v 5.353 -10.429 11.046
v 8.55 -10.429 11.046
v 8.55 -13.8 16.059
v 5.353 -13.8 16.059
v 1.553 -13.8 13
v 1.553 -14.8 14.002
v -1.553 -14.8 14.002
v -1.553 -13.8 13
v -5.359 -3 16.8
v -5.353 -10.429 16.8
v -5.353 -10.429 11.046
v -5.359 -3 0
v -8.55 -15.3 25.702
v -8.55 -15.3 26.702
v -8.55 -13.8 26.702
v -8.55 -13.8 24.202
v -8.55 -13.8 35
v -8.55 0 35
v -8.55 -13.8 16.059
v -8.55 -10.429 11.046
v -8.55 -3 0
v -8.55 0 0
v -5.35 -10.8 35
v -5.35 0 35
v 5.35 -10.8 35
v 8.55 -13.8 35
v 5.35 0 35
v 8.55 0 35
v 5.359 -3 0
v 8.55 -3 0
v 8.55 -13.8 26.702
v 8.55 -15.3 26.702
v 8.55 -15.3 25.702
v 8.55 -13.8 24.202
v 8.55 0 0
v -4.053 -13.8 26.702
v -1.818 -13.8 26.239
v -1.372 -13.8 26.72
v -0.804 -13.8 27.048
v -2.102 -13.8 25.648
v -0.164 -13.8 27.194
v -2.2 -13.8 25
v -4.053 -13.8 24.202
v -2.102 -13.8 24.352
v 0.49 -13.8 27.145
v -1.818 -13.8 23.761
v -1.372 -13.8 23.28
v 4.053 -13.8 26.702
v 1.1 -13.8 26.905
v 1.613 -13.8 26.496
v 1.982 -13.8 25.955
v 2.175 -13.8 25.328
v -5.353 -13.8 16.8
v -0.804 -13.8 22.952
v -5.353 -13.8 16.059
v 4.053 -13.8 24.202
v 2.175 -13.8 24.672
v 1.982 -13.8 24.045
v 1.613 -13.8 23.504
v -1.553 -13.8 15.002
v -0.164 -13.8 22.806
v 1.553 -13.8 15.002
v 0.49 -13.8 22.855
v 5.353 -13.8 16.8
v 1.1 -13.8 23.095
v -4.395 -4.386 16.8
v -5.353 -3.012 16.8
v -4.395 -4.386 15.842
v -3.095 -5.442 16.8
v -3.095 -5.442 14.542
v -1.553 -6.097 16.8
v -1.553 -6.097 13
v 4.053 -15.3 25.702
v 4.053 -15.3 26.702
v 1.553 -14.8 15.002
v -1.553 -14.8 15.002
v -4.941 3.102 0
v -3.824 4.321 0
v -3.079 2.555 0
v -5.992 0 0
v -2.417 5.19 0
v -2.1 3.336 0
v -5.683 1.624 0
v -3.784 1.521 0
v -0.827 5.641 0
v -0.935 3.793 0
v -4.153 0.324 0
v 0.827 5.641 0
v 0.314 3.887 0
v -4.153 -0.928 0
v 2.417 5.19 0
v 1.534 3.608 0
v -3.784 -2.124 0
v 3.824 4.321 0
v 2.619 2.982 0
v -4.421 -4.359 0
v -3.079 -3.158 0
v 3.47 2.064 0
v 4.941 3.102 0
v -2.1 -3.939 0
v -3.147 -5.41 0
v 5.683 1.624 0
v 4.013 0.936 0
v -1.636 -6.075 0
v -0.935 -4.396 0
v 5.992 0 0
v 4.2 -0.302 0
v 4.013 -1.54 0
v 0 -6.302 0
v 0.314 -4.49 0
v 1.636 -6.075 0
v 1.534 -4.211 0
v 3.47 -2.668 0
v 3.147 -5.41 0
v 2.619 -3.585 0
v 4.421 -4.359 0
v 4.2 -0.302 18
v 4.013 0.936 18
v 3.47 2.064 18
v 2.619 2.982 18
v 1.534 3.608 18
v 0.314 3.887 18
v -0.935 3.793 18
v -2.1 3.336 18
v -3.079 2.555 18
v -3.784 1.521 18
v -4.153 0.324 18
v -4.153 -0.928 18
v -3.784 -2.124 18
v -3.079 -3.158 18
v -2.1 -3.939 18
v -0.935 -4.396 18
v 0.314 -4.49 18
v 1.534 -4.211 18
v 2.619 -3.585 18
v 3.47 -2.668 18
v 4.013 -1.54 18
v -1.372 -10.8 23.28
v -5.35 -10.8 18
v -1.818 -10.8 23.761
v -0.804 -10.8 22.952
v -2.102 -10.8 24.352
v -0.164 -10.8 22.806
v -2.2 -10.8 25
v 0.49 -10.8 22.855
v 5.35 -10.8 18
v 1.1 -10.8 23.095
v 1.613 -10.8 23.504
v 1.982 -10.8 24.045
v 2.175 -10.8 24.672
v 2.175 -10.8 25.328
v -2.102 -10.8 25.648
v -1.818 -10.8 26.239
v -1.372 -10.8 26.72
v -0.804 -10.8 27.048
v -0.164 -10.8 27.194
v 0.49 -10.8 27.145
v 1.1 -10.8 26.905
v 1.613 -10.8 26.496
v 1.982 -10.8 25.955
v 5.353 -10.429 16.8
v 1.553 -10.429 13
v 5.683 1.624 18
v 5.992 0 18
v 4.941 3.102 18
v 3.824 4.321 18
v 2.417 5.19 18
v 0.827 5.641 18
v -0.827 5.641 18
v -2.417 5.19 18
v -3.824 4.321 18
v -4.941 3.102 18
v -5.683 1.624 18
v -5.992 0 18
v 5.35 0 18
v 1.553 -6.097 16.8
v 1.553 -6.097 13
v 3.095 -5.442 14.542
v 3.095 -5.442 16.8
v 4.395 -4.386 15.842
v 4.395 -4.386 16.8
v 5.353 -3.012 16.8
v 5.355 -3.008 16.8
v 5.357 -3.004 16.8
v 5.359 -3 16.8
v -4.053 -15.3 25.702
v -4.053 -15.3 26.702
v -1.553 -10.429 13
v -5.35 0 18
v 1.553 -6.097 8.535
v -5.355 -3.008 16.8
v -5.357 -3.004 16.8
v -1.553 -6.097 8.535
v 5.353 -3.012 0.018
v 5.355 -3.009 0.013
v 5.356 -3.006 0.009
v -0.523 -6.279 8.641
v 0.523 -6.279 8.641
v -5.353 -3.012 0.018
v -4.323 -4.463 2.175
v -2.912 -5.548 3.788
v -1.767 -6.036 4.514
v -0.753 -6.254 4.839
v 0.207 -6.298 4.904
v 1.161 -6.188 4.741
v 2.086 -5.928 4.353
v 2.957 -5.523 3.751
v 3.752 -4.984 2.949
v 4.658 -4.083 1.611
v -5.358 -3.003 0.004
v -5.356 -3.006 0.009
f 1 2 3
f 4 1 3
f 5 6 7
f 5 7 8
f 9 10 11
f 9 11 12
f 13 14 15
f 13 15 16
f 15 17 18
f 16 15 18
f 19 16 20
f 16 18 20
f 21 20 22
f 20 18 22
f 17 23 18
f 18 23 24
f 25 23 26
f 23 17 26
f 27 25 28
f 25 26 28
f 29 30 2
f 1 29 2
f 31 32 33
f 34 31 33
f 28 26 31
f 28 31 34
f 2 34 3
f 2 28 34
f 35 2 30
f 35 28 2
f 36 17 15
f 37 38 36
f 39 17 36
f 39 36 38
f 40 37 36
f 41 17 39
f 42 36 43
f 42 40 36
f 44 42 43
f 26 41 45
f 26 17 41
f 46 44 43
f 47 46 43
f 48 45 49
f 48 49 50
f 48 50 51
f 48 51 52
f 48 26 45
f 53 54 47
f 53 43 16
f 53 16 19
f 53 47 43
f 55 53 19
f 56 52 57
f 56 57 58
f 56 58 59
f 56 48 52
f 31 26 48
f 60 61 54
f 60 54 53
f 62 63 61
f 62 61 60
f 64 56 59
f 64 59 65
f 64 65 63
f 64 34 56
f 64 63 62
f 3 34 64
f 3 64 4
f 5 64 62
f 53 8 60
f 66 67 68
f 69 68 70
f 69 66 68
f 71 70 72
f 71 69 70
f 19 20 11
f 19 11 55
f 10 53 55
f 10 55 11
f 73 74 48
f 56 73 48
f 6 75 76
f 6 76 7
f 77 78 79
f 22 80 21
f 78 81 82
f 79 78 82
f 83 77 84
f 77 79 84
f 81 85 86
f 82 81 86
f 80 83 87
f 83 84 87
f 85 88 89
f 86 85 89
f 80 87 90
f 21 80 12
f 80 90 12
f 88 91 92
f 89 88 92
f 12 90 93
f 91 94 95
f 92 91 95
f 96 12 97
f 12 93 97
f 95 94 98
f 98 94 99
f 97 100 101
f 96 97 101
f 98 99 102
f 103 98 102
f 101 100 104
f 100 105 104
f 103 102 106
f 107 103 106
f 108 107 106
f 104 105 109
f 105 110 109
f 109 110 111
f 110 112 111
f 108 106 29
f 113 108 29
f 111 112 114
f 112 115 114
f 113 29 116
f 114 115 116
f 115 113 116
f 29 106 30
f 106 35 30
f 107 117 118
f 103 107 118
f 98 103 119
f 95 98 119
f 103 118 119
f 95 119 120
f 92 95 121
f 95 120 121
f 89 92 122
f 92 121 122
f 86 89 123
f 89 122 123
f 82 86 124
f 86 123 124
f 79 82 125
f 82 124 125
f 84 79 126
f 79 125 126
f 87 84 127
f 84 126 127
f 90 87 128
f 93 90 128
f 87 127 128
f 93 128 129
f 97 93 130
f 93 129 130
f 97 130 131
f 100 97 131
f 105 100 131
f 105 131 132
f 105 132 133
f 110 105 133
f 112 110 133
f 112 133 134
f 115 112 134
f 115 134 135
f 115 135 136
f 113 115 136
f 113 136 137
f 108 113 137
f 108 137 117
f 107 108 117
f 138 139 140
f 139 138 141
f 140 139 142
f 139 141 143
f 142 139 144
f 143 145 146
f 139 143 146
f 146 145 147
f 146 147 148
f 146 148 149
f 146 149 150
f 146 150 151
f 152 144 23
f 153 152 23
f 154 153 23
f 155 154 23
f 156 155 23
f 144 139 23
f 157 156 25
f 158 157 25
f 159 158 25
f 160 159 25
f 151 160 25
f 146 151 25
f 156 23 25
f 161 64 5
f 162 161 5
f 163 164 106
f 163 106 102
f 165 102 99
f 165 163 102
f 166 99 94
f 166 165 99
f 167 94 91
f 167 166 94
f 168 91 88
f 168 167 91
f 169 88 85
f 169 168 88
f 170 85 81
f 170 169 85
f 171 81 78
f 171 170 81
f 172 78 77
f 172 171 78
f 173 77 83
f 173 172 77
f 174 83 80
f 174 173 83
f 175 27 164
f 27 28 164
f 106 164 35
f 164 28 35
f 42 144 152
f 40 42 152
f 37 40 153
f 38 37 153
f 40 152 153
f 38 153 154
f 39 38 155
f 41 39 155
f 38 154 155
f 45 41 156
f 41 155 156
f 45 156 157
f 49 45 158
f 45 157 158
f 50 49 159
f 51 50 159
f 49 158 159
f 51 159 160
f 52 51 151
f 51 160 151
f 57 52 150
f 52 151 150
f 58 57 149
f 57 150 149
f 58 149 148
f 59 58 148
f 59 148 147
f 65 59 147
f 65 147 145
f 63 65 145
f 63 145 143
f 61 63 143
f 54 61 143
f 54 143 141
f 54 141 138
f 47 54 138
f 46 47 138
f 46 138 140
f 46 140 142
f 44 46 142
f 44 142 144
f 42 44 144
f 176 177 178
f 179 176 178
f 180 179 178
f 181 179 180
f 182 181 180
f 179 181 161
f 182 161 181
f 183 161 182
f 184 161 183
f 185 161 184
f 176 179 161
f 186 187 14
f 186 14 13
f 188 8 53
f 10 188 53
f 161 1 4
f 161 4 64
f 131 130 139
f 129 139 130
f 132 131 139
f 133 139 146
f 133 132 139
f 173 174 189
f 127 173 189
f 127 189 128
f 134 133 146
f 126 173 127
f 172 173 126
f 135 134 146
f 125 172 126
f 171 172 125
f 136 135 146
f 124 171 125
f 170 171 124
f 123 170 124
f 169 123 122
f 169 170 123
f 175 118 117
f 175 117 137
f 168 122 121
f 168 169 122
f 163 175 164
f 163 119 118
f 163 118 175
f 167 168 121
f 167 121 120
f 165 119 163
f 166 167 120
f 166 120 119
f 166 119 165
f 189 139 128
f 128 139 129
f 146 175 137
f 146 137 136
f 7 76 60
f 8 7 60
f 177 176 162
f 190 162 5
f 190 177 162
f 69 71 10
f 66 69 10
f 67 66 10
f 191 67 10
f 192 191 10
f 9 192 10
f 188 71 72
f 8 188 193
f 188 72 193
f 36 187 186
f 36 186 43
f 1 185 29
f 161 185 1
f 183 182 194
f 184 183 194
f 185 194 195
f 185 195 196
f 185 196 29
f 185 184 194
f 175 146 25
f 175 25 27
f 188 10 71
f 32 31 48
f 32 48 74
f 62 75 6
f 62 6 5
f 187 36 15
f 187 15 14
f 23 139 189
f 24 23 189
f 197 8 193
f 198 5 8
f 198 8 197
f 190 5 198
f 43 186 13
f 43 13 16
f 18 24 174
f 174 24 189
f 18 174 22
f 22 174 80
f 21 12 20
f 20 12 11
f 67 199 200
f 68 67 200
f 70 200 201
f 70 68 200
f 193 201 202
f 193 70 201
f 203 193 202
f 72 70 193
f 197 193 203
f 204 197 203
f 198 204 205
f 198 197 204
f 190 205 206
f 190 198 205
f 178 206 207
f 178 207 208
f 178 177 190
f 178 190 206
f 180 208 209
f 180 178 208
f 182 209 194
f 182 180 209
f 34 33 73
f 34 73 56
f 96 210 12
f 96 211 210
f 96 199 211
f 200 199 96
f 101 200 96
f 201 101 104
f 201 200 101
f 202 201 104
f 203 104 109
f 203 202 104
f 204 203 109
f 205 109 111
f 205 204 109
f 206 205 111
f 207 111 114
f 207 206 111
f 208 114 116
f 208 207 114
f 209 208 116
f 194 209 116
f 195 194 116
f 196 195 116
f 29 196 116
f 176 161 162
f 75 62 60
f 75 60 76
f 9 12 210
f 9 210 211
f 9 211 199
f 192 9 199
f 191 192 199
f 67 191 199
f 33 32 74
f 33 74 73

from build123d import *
from build123d.topology import SkipClean

# Parameters (mm, degrees)
BOSS_EXTRUDE1_DEPTH     = 8.55
SKETCH2_W               = 10.7
SKETCH2_H               = 10.8
CUT_EXTRUDE1_DEPTH      = 17
SKETCH3_R               = 6
BOSS_EXTRUDE2_DEPTH     = 18
SKETCH4_R               = 4.2
CUT_EXTRUDE2_DEPTH      = 25.239275979
BOSS_EXTRUDE5_DEPTH     = 17.1
SKETCH7_R               = 2.2
CUT_EXTRUDE3_DEPTH      = 40.626944786
CUT_EXTRUDE4_REACH      = 33.94
SKETCH10_W              = 8.106
SKETCH10_H              = 1.5
SKETCH11_W              = 6.997
SKETCH11_H              = 1
CUT_EXTRUDE5_DEPTH      = 27.591587091
CUT_EXTRUDE6_REACH      = 42.967
CUT_EXTRUDE6_END_RADIUS = 6
CUT_EXTRUDE7_START      = -16.8
CUT_EXTRUDE7_DEPTH      = 16.8
BOSS_EXTRUDE6_DEPTH     = 1.553
BOSS_EXTRUDE7_REACH     = 36.128
CUT_EXTRUDE8_REACH      = 43.851
CUT_EXTRUDE9_REACH      = 43.851


with BuildPart() as part:
    # Sketch1 → Boss-Extrude1 (new, symmetric)
    with BuildSketch(Plane(origin=(0, 0, 0), x_dir=(0, 0, -1), z_dir=(1, 0, 0))):
        Polygon((0, 0), (0, -3), (-16.0587, -13.8), (-35, -13.8), (-35, 0), align=None)
    extrude(amount=BOSS_EXTRUDE1_DEPTH, both=True)

    # Sketch2 → Cut-Extrude1 (cut)
    with BuildSketch(Plane.XY.offset(35)):
        with Locations((0, -5.4)):
            Rectangle(SKETCH2_W, SKETCH2_H)
    extrude(amount=-CUT_EXTRUDE1_DEPTH, mode=Mode.SUBTRACT)

    # Sketch3 → Boss-Extrude2 (add, through all)
    with BuildSketch(Plane.XY.offset(18)):
        with Locations((0, -0.30175)):
            Circle(SKETCH3_R)
    extrude(amount=-BOSS_EXTRUDE2_DEPTH)

    # Sketch4 → Cut-Extrude2 (cut, through all)
    with BuildSketch(Plane.XY.offset(18)):
        with Locations((0, -0.30175)):
            Circle(SKETCH4_R)
    extrude(amount=-CUT_EXTRUDE2_DEPTH, mode=Mode.SUBTRACT)

    # Sketch8 → Boss-Extrude5 (add, through all)
    with BuildSketch(Plane(origin=(8.55, 0, 0), x_dir=(0, 0, -1), z_dir=(1, 0, 0))):
        Polygon((-26.702, -13.8), (-26.702, -15.3), (-25.702, -15.3), (-24.202, -13.8), align=None)
        Polygon((-16.0587, -13.8), (-15.002, -13.8), (-15.002, -14.8), (-14.002, -14.8), (-13, -13.8), (-11.045997115, -10.428793666), align=None)
    extrude(amount=-BOSS_EXTRUDE5_DEPTH)

    # Sketch7 → Cut-Extrude3 (cut, through all)
    with BuildSketch(Plane(origin=(0, -10.8, 0), x_dir=(1, 0, 0), z_dir=(0, 1, 0))):
        with Locations(Location((0, -25, 0), (0, 0, 180))):
            Circle(SKETCH7_R)
    extrude(amount=-CUT_EXTRUDE3_DEPTH, mode=Mode.SUBTRACT)

    # Cut-Extrude4: up to this plane
    cut_extrude4_end = Plane(origin=(-8.55, -15.3, 25.702), z_dir=(0, -0.7071067811865471, -0.707106781186548))
    # Sketch10 → Cut-Extrude4 (cut, up to the surface)
    with BuildSketch(Plane.XY.offset(26.702), mode=Mode.PRIVATE) as cut_extrude4_sk1:
        with Locations((0, -14.55)):
            Rectangle(SKETCH10_W, SKETCH10_H)
    cut_extrude4_tool1 = split(extrude(cut_extrude4_sk1.sketch, amount=-CUT_EXTRUDE4_REACH, mode=Mode.PRIVATE), bisect_by=cut_extrude4_end, keep=Keep.BOTH, mode=Mode.PRIVATE)
    add(cut_extrude4_tool1.solids().sort_by_distance((0, -14.55, 26.702))[0], mode=Mode.SUBTRACT)

    # Sketch11 → Cut-Extrude5 (cut, through all)
    with BuildSketch(Plane.XY.offset(15.002)):
        with Locations((-5.0515, -14.3)):
            Rectangle(SKETCH11_W, SKETCH11_H)
        with Locations((5.0515, -14.3)):
            Rectangle(SKETCH11_W, SKETCH11_H)
    extrude(amount=-CUT_EXTRUDE5_DEPTH, mode=Mode.SUBTRACT)

    # Cut-Extrude6: up to this cylinder (the profile starts outside it)
    cut_extrude6_end = Plane(origin=(0, -0.30175, 7.230062), z_dir=(0, 0, 1)) * Cylinder(CUT_EXTRUDE6_END_RADIUS, 98.934, mode=Mode.PRIVATE)
    # Sketch12 → Cut-Extrude6 (cut, up to the surface)
    with BuildSketch(Plane.XZ.offset(13.8), mode=Mode.PRIVATE) as cut_extrude6_sk1:
        Polygon((-1.553, 13), (-5.353, 16.8), (-5.353, 0), (5.353, 0), (5.353, 16.8), (1.553, 13), align=None)
    cut_extrude6_tool1 = extrude(cut_extrude6_sk1.sketch, amount=-CUT_EXTRUDE6_REACH, mode=Mode.PRIVATE) - cut_extrude6_end
    add(cut_extrude6_tool1.solids().sort_by_distance((0, -13.8, 7.230062))[0], mode=Mode.SUBTRACT)

    # Sketch13 → Cut-Extrude7 (cut)
    with SkipClean():  # the faces are left unmerged after this step: merging them gives an invalid solid
        with BuildSketch(Plane(origin=(0, 0, 0), x_dir=(-1, 0, 0), z_dir=(0, 0, -1)).offset(CUT_EXTRUDE7_START)):
            with BuildLine():
                Line((-5.359052802, -3), (-5.353, -10.428793666))
                Line((-5.353, -10.428793666), (5.353, -10.428793666))
                Line((5.353, -10.428793666), (5.359052802, -3))
                ThreePointArc((5.359052802, -3), (0, -6.30175), (-5.359052802, -3))
            make_face()
        extrude(amount=CUT_EXTRUDE7_DEPTH, mode=Mode.SUBTRACT)

    # Sketch14 → Boss-Extrude6 (add, symmetric)
    with SkipClean():  # the faces are left unmerged after this step: merging them gives an invalid solid
        with BuildSketch(Plane(origin=(0, 0, 0), x_dir=(0, 0, -1), z_dir=(1, 0, 0))):
            Polygon((-13, -13.8), (-8.073269662, -5.3), (-16.8, -5.3), (-16.8, -13.8), align=None)
        extrude(amount=BOSS_EXTRUDE6_DEPTH, both=True)

    # Sketch15 → Boss-Extrude7 (add, up to next)
    with BuildSketch(Plane(origin=(-7.436377386, -6.523873454, 7.436377386), x_dir=(-0.7993387140757535, 0.3962687040508023, -0.4516953999872244), z_dir=(0.6008807037838052, 0.5271477588310114, -0.6008807037838052)), mode=Mode.PRIVATE) as boss_extrude7_sk1:
        Polygon((-11.246017774, 0.733681451), (-11.246017774, 6.495798547), (-15.999947407, 3.239704803), align=None)
    boss_extrude7_tool1 = extrude(boss_extrude7_sk1.sketch, amount=-BOSS_EXTRUDE7_REACH, mode=Mode.PRIVATE) - part.part
    boss_extrude7 = boss_extrude7_tool1.solids().sort_by_distance((2.819667, -8.984956, 15.533333))[0]
    add(boss_extrude7)

    # Mirror1: Boss-Extrude7 across plane
    with SkipClean():  # the faces are left unmerged after this step: merging them gives an invalid solid
        add(boss_extrude7.mirror(Plane(origin=(0, 0, 0), x_dir=(0, 0, 1), z_dir=(1, 0, 0))))

    # Sketch16 → Cut-Extrude8 (cut, up to next)
    with BuildSketch(Plane(origin=(8.55, 0, 0), x_dir=(0, 0, -1), z_dir=(1, 0, 0)), mode=Mode.PRIVATE) as cut_extrude8_sk1:
        Polygon((-11.045997115, -10.428793666), (-16.0587, -13.8), (-13, -13.8), align=None)
    cut_extrude8_tool1 = extrude(cut_extrude8_sk1.sketch, amount=-CUT_EXTRUDE8_REACH, mode=Mode.PRIVATE) & part.part
    add(cut_extrude8_tool1.solids().sort_by_distance((8.55, -12.676265, 13.368232))[0], mode=Mode.SUBTRACT)

    # Sketch17 → Cut-Extrude9 (cut, up to next)
    with BuildSketch(Plane.ZY.offset(8.55), mode=Mode.PRIVATE) as cut_extrude9_sk1:
        Polygon((11.045997115, -10.428793666), (16.0587, -13.8), (13, -13.8), align=None)
    cut_extrude9_tool1 = extrude(cut_extrude9_sk1.sketch, amount=-CUT_EXTRUDE9_REACH, mode=Mode.PRIVATE) & part.part
    add(cut_extrude9_tool1.solids().sort_by_distance((-8.55, -12.676265, 13.368232))[0], mode=Mode.SUBTRACT)


solid = part.part
